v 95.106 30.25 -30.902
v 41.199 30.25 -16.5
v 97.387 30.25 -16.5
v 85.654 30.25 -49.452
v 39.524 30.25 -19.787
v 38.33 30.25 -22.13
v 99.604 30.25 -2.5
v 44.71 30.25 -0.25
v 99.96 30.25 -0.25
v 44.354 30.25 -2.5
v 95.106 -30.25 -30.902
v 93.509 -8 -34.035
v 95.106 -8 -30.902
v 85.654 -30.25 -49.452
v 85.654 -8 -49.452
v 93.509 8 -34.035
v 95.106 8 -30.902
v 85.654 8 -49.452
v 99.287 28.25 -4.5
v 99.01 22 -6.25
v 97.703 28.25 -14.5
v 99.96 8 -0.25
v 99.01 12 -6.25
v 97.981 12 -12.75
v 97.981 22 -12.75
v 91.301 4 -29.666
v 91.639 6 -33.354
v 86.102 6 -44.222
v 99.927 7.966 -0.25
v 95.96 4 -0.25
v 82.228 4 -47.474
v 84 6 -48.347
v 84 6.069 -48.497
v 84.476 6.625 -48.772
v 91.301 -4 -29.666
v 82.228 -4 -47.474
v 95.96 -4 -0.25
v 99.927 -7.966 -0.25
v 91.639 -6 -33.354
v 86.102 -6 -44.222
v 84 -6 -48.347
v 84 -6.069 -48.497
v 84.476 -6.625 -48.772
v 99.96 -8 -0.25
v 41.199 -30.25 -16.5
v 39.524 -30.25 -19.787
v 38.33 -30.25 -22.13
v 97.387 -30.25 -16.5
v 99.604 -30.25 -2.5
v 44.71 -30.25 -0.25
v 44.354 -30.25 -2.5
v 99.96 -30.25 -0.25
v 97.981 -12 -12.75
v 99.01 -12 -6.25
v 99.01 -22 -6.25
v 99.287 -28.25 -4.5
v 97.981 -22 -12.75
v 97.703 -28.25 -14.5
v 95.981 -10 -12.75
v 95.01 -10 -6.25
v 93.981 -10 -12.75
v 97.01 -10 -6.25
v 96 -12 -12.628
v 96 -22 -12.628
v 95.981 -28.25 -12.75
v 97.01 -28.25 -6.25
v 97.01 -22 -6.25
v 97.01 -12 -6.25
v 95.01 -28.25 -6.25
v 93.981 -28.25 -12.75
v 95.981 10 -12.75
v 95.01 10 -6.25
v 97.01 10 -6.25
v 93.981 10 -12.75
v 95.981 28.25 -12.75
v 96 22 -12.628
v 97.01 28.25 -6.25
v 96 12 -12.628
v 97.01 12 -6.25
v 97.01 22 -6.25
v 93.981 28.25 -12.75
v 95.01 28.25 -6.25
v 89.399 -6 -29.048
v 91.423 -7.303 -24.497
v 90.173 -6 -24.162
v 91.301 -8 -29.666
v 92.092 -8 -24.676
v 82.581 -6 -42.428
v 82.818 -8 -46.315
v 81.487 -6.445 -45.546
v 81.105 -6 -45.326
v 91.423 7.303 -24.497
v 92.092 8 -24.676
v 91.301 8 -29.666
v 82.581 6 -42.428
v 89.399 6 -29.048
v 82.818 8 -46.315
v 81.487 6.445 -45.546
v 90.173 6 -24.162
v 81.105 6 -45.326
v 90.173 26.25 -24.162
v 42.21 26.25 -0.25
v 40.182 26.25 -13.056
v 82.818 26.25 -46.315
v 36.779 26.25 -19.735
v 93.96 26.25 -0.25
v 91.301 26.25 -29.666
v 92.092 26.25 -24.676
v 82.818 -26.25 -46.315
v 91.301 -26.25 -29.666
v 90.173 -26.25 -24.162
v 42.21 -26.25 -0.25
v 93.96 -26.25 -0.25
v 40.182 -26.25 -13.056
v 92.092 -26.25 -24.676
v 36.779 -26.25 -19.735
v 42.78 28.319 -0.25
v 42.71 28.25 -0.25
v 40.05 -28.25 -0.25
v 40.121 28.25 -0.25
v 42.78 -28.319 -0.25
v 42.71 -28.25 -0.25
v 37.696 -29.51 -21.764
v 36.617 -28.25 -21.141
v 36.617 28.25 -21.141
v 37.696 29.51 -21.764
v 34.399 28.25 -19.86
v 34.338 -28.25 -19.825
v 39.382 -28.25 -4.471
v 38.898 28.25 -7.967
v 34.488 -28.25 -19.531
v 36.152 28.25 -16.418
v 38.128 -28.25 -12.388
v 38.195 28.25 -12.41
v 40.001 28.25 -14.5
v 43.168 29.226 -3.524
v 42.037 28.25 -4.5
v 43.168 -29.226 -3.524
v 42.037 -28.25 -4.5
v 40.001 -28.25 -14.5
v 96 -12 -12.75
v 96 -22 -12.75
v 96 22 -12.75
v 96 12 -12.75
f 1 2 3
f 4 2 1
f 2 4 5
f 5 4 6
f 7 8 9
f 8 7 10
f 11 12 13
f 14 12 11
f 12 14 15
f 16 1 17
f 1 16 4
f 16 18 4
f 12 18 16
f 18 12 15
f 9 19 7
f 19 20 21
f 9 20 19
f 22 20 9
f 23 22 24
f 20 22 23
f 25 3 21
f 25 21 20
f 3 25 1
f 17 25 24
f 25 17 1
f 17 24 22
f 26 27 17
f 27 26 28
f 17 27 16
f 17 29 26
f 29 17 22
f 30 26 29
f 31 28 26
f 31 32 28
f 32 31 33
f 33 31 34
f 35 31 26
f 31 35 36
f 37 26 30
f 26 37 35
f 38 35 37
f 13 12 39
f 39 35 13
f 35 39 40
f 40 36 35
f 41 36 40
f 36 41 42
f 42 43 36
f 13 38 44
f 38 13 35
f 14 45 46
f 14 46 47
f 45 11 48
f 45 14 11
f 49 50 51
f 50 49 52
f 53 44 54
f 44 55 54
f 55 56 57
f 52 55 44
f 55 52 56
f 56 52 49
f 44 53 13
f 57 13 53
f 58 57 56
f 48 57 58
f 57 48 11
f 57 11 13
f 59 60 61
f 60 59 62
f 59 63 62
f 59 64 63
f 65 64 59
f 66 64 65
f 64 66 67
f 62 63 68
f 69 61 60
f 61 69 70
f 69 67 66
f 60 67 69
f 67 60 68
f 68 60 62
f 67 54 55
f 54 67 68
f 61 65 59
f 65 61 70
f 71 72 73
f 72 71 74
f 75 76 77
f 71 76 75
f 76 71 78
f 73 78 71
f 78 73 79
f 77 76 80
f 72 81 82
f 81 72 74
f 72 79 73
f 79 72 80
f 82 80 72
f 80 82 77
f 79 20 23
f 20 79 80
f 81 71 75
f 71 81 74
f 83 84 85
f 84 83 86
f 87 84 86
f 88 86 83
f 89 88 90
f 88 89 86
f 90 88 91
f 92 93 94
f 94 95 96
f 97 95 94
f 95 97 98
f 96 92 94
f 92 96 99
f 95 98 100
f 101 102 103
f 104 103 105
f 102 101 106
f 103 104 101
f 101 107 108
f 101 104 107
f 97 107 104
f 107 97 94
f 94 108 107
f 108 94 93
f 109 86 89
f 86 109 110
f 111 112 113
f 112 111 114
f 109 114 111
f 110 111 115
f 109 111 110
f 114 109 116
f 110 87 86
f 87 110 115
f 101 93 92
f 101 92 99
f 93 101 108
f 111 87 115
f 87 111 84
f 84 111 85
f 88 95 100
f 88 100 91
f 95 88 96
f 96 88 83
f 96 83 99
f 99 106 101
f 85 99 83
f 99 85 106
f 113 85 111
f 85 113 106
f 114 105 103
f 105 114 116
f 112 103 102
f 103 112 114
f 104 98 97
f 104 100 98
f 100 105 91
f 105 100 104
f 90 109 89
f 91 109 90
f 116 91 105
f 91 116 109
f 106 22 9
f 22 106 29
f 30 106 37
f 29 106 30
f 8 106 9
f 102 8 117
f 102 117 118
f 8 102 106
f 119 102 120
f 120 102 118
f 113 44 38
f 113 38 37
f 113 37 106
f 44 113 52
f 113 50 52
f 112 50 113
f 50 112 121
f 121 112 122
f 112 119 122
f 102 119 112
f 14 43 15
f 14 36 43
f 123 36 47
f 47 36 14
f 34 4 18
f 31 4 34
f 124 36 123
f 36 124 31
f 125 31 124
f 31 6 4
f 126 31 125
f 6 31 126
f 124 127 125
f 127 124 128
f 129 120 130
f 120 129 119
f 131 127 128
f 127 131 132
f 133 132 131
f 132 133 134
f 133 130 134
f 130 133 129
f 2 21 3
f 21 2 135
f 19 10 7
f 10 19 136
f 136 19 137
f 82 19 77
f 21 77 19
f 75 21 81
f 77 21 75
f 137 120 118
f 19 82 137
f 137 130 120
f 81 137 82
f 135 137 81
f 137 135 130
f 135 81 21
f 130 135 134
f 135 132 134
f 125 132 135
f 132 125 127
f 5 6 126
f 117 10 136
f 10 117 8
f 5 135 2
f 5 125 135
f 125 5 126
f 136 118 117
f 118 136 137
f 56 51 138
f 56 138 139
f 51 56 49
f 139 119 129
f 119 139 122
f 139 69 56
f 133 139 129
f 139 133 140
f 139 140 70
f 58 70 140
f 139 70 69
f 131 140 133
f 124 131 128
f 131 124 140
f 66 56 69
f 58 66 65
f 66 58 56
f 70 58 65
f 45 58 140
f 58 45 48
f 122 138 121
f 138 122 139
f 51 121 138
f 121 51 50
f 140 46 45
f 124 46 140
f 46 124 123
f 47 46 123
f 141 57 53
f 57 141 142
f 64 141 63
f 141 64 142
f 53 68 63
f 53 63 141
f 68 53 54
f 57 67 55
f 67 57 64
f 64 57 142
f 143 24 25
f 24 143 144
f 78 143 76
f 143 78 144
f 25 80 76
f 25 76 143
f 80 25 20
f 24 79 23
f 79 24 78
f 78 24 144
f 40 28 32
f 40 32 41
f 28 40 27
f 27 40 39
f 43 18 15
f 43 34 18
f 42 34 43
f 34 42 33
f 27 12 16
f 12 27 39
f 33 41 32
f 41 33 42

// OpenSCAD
/* [Dimensions] */
Outer_Spool_Diameter = 200; //[150:400]
Inner_Spool_Diameter = 80;  //[50:200]
Inner_Spool_Width = 61; //[42:150]
Resolution = 20; //[20:50:200]
Lock_Tolerance = 0.15; //[0.05:0.05:0.2]
/* [Show] */
showLid = false;
showGuides= false;
showMainBin= true;

Split_Guides = true;

/* [Options] */
Bin_Handle = "Flat"; //["None","Flat","Curved"]
makeLid=false;

/* [Hidden] */
$fn=Resolution;

// Common variables
Tolerance = 0 + 0.25;
Max_Measurement = Outer_Spool_Diameter + 1;
Outer_Spool_Radius = Outer_Spool_Diameter / 2;
Inner_Spool_Radius = Inner_Spool_Diameter / 2;

// Core section variables
Core_Edge_Width = 0 + 22.25;
Core_Chamfer_Width = 0 + 4;
Core_Center_Width = Inner_Spool_Width - (Core_Chamfer_Width * 2 + Core_Edge_Width * 2 + Tolerance * 2);
Core_Total_Width = 2 * (Core_Edge_Width + Core_Chamfer_Width + Core_Center_Width/2);
Core_Inset_Radius = Outer_Spool_Radius - Core_Chamfer_Width;
Handle_Width = 0 + 20;

// Track variables
Guide_Track_Radius = Inner_Spool_Radius + Tolerance + 2.5;

Core_Edge_Offset = (Core_Center_Width/2) + Core_Chamfer_Width + (Core_Edge_Width/2);
Core_Chamfer_Offset = (Core_Center_Width/2) + (Core_Chamfer_Width/2);



////// Lid //////
if (showLid) translate([0,0,10]) lid();
if (showMainBin) mainBin();


module lid(){
  difference() {
    union() {
      intersection() {
        union() {
          translate([Inner_Spool_Radius - 10,-Core_Total_Width/2 + 3 + Tolerance / 2,-1]) {
            rotate(-45, [1,0,0]) {
              cube([Max_Measurement, sin(45) * 2, cos(45) * 2]);
            }
          }
          translate([Inner_Spool_Radius - 10,Core_Total_Width/2 - 5 - Tolerance / 2,-1]) {
            rotate(-45, [1,0,0]) {
              cube([Max_Measurement, sin(45) * 2, cos(45) * 2]);
            }
          }
            translate([Inner_Spool_Radius -10,-Core_Total_Width/2 + 4 + Tolerance / 2,-2]) {
              cube([Max_Measurement, Core_Total_Width-8 - Tolerance, 1.75]);
            }
          }
          rotate(90, [1,0,0]) {
            difference() {
              cylinder(Core_Total_Width, Outer_Spool_Radius, Outer_Spool_Radius, true);
              cylinder(Core_Total_Width + 1, Inner_Spool_Radius + 2.5, Inner_Spool_Radius + 2.5, true);
            }
          }
        }
        translate([Inner_Spool_Radius + 2,0, .625 - 1.75]) {
          cube([4, 10 - Tolerance/2, 1.75], true);
        }
      }
      translate([0,-Max_Measurement/2,-.25]) {
        cube([Max_Measurement, Max_Measurement, 10]);
      }
    }
  
}

module mainBin() {
////// MAIN BIN //////
// Union handle with bin.
union() {
  // Form exterior bin shape.
  difference() {
    // Form main bin shape.
    union() {
      // Form right edge section.
      translate([0,Core_Edge_Offset,0]) {
        rotate(90, [1,0,0]) {
          cylinder(Core_Edge_Width, Outer_Spool_Radius, Outer_Spool_Radius, true);
        }
      }
      // Form right chamfer section
      translate([0,Core_Chamfer_Offset,0]) {
        rotate(90, [1,0,0]) {
          cylinder(Core_Chamfer_Width, Outer_Spool_Radius, Core_Inset_Radius, true);
        }
      }
      // Form center section.
      if (Core_Center_Width > 0) {
        rotate(90, [1,0,0]) {
          cylinder(Core_Center_Width, Core_Inset_Radius, Core_Inset_Radius, true);
        }
      }
      // Form left chamfer section.
      translate([0,-Core_Chamfer_Offset,0]) {
        rotate(90, [1,0,0]) {
          cylinder(Core_Chamfer_Width, Core_Inset_Radius, Outer_Spool_Radius, true);
        }
      }
      // Form left edge section.
      translate([0,-Core_Edge_Offset,0]) {
        rotate(90, [1,0,0]) {
          cylinder(Core_Edge_Width, Outer_Spool_Radius, Outer_Spool_Radius, true);
        }
      }
    }
    // Slice off top of Bin.
    translate([-Outer_Spool_Radius,-Outer_Spool_Radius,-Tolerance]) {
      cube([Max_Measurement, Max_Measurement, Max_Measurement]);
    }
    // Slice off bottom of Bin.
    translate([0,-Outer_Spool_Radius,0]) {
      rotate(120, [0,1,0]) {
        translate([0,0,Tolerance]) {
          cube([Max_Measurement, Max_Measurement, Max_Measurement]);
        }
      }
    }
    // Slice off back of Bin.
    translate([0,0,0]) {
      rotate(90, [1,0,0]) {
        cylinder(Max_Measurement, Inner_Spool_Radius + Tolerance, Inner_Spool_Radius, true);
      }
    }
    // Remove remaining scrap from Bin.
    translate([-Max_Measurement,-Outer_Spool_Radius,-Outer_Spool_Radius]) {
      cube([Max_Measurement, Max_Measurement, Max_Measurement]);
    }
    // Carve out right track.
    translate([0,Core_Total_Width/2 - 2,-2.5]) {
      rotate(90, [0,1,0]) {
        linear_extrude(Max_Measurement) {
          polygon([[2,0],[0,2],[14,2],[12,0]]);
        }
      }
    }
    translate([0,Core_Total_Width/2 + 2,0]) {
      rotate(90, [1,0,0]) {
        cylinder(4, Guide_Track_Radius + 4, Guide_Track_Radius, false);
      }
    }
    // Carve out left track.
    translate([0,-Core_Total_Width/2 + 2,-2.5]) {
      rotate(90, [0,1,0]) {
        linear_extrude(Max_Measurement) {
          polygon([[2,0],[0,-2],[14,-2],[12,0]]);
        }
      }
    }
    translate([0,-Core_Total_Width/2 + 2,0]) {
      rotate(90, [1,0,0]) {
        cylinder(4, Guide_Track_Radius, Guide_Track_Radius + 4, false);
      }
    }
    // Form Left Lock Track
    intersection() {
      difference() {
        translate([0,-Core_Total_Width/2 + 20.25]) {
          rotate(90, [1,0,0]) {
            cylinder(20.25, Core_Inset_Radius + 2, Core_Inset_Radius + 2, false);
          }
        }
        translate([0,-Core_Total_Width/2 + 21.25]) {
          rotate(90, [1,0,0]) {
            cylinder(22.25, Core_Inset_Radius, Core_Inset_Radius, false);
          }
        }
       
      }
      translate([0,-Max_Measurement/2,-12.75]) {
        cube([Max_Measurement, Max_Measurement, 6.5]);
      }
    }
    translate([Core_Inset_Radius,-Core_Total_Width/2 + 8.25,-12.75]) {
      cube([Max_Measurement, 10, 6.5]);
    }
 
    // Form Right Lock Track
    intersection() {
      difference() {
        translate([0,Core_Total_Width/2]) {
          rotate(90, [1,0,0]) {
            cylinder(20.25, Core_Inset_Radius + 2, Core_Inset_Radius + 2, false);
          }
        }
        translate([0,Core_Total_Width/2 + 1]) {
          rotate(90, [1,0,0]) {
            cylinder(22.25, Core_Inset_Radius, Core_Inset_Radius, false);
          }
        }
      }
      translate([0,-Max_Measurement/2,-12.75]) {
        cube([Max_Measurement, Max_Measurement, 6.5]);
      }
    }
    translate([Core_Inset_Radius,Core_Total_Width/2 - 18.25,-12.75]) {
      cube([Max_Measurement, 10, 6.5]);
    }

    // Carve out showLid slot
    if (makeLid) {
      difference() {
        union() {
          translate([Inner_Spool_Radius+2,-Core_Total_Width/2 + 3,-1]) 
            rotate([-45,0,0]) 
              cube([Max_Measurement, sin(45) * 2, cos(45) * 2]);
            
          
          translate([Inner_Spool_Radius+2,Core_Total_Width/2 - 5,-1]) 
            rotate([-45,0,0]) 
              cube([Max_Measurement, sin(45) * 2, cos(45) * 2]);
            
          
          translate([Inner_Spool_Radius+2,-Core_Total_Width/2 + 4,-2]) {
            cube([Max_Measurement, Core_Total_Width-8, 3]);
          }
        }
        rotate(90, [1,0,0]) {
          cylinder(Max_Measurement, Inner_Spool_Radius + 2.5, Inner_Spool_Radius + 2, true);
        }
      }
      translate([0,0,Tolerance/2]) {
        cube([Max_Measurement, 10, 4], true);
      }
    } //makeLid


    // Remove bin interior.
    difference() {
      union() {
        rotate(90, [1,0,0]) {
          cylinder(Core_Total_Width - 8, Outer_Spool_Radius - 6, Outer_Spool_Radius - 6, true);
        }
        difference() {
          union() {
            if (Core_Center_Width > 0) {
              translate([0,-Core_Center_Width/2,0]) {
                rotate(90, [1,0,0]) {
                  cylinder(Core_Chamfer_Width, Core_Inset_Radius - 4, Core_Inset_Radius);
                }
              }
              translate([0,Core_Center_Width/2 + 4,0]) {
                rotate(90, [1,0,0]) {
                  cylinder(Core_Chamfer_Width, Core_Inset_Radius, Core_Inset_Radius - 4);
                }
              }
              translate([0,Core_Total_Width/2 - 4,0]) {
                rotate(90, [1,0,0]) {
                  cylinder(Core_Edge_Width - 4, Core_Inset_Radius, Core_Inset_Radius);
                }
              }
              translate([0,-Core_Center_Width/2 - 4,0]) {
                rotate(90, [1,0,0]) {
                  cylinder(Core_Edge_Width - 4, Core_Inset_Radius, Core_Inset_Radius);
                }
              }
            }
          }
          translate([0,-Max_Measurement/2,0]) {
            rotate(15, [0,1,0]) {
              cube([Max_Measurement, Max_Measurement, Max_Measurement]);
            }
          }

        }
      }
      translate([0,0,0]) {
        rotate(90, [1,0,0]) {
          cylinder(Core_Total_Width, Inner_Spool_Radius + Tolerance + 2, Inner_Spool_Radius + Tolerance + 2, true);
        }
      }
      //
      translate([0,-Outer_Spool_Radius,1.5]) {
        rotate(120, [0,1,0]) {
          cube([Max_Measurement, Max_Measurement, Max_Measurement]);
        }
      }
    }
  }

  if (Bin_Handle == "Flat") {
    if (Core_Center_Width > 0) {
      difference() {
        // Form handle
        translate([0,0,0]) {
          rotate(90, [1,0,0]) {
            cylinder(Core_Center_Width + Core_Chamfer_Width * 2, Outer_Spool_Radius, Outer_Spool_Radius, true);
          }
        }
        // Form inside of handle
        translate([0,0,0]) {
          rotate(90, [1,0,0]) {
            cylinder(Core_Center_Width + Core_Chamfer_Width * 2 + 2, Outer_Spool_Radius - 2, Outer_Spool_Radius - 2, true);
          }
        }
        // Form bottom of handle
        translate([0,-Outer_Spool_Radius,0]) {
          rotate(120, [0,1,0]) {
            cube([Max_Measurement, Max_Measurement, Max_Measurement]);
          }
        }
        // Form top of handle
        translate([0,-Outer_Spool_Radius,0]) {
          rotate(20, [0,1,0]) {
            cube([Max_Measurement, Max_Measurement, Max_Measurement]);
          }
        }
        // Remove scrap from handle.
        translate([-Max_Measurement + Outer_Spool_Radius - 16,-Outer_Spool_Radius,-Outer_Spool_Radius]) {
          cube([Max_Measurement, Max_Measurement, Max_Measurement]);
        }
      }
    } else {
    }
  }

  else if (Bin_Handle == "Curved") {
    if (Core_Center_Width > 0) {
      difference() {
        union() {
          // Form handle
          rotate(90, [1,0,0]) {
            cylinder(Core_Center_Width, Outer_Spool_Radius + 4, Outer_Spool_Radius + 4, true);
          }
          translate([0,Core_Center_Width/2 + Core_Chamfer_Width / 2 ,0]) {
            rotate(90, [1,0,0]) {
              cylinder(Core_Chamfer_Width, Outer_Spool_Radius, Outer_Spool_Radius + 4, true);
            }
          }
          translate([0,-Core_Center_Width/2 - Core_Chamfer_Width / 2 ,0]) {
            rotate(90, [1,0,0]) {
              cylinder(Core_Chamfer_Width, Outer_Spool_Radius + 4, Outer_Spool_Radius, true);
            }
          }
        }
        // Form inside of handle
        rotate(90, [1,0,0]) {
          cylinder(Core_Center_Width, Outer_Spool_Radius, Outer_Spool_Radius, true);
        }
        translate([0,-Core_Center_Width/2 - Core_Chamfer_Width / 2,0]) {
          rotate(90, [1,0,0]) {
            cylinder(Core_Chamfer_Width, Outer_Spool_Radius, Core_Inset_Radius, true);
          }
        }
        translate([0,Core_Center_Width/2 + Core_Chamfer_Width / 2 ,0]) {
          rotate(90, [1,0,0]) {
            cylinder(Core_Chamfer_Width, Core_Inset_Radius, Outer_Spool_Radius, true);
          }
        }
        // Form bottom of handle
        translate([0,-Outer_Spool_Radius,0]) {
          rotate(120, [0,1,0]) {
            cube([Max_Measurement, Max_Measurement, Max_Measurement]);
          }
        }
        // Form top of handle
        translate([0,-Outer_Spool_Radius,0]) {
          rotate(20, [0,1,0]) {
            cube([Max_Measurement, Max_Measurement, Max_Measurement]);
          }
        }
        // Remove scrap from handle.
        translate([-Max_Measurement + Outer_Spool_Radius - 16,-Outer_Spool_Radius,-Outer_Spool_Radius]) {
          cube([Max_Measurement, Max_Measurement, Max_Measurement*2]);
        }
        rotate(90, [1,0,0]) {
          cylinder(Core_Total_Width - 8, Outer_Spool_Radius - 6, Outer_Spool_Radius - 6, true);
        }
      }
    } else {
      difference() {
        union() {
          Handle_Width = Core_Edge_Width;
          // Form handle
          rotate(90, [1,0,0]) {
            cylinder(Handle_Width, Outer_Spool_Radius + 4, Outer_Spool_Radius + 4, true);
          }
          translate([0,Handle_Width/2 + Core_Chamfer_Width / 2 ,0]) {
            rotate(90, [1,0,0]) {
              cylinder(Core_Chamfer_Width, Outer_Spool_Radius, Outer_Spool_Radius + 4, true);
            }
          }
          translate([0,-Handle_Width/2 - Core_Chamfer_Width / 2 ,0]) {
            rotate(90, [1,0,0]) {
              cylinder(Core_Chamfer_Width, Outer_Spool_Radius + 4, Outer_Spool_Radius, true);
            }
          }
        }

        // Remove inside of handle
        rotate(90, [1,0,0]) {
          cylinder(Handle_Width - 2, Outer_Spool_Radius + 2, Outer_Spool_Radius + 2, true);
        }
        translate([0, Handle_Width/2, 0]) {
          rotate(90, [1,0,0]) {
            cylinder(Core_Chamfer_Width - 2, Outer_Spool_Radius, Outer_Spool_Radius + 2, true);
          }
        }
        translate([0, -Handle_Width/2, 0]) {
          rotate(90, [1,0,0]) {
            cylinder(Core_Chamfer_Width - 2, Outer_Spool_Radius + 2, Outer_Spool_Radius, true);
          }
        }


        // Form bottom of handle
        translate([0,-Outer_Spool_Radius,0]) {
          rotate(120, [0,1,0]) {
            cube([Max_Measurement, Max_Measurement, Max_Measurement]);
          }
        }
        // Form top of handle
        translate([0,-Outer_Spool_Radius,0]) {
          rotate(20, [0,1,0]) {
            cube([Max_Measurement, Max_Measurement, Max_Measurement]);
          }
        }
        // Remove scrap from handle.
        translate([-Max_Measurement + Outer_Spool_Radius - 16,-Outer_Spool_Radius,-Outer_Spool_Radius]) {
          cube([Max_Measurement, Max_Measurement, Max_Measurement*2]);
        }
        rotate(90, [1,0,0]) {
          cylinder(Core_Total_Width - 8, Outer_Spool_Radius - 6, Outer_Spool_Radius - 6, true);
        }
      }
    }
  }
}
}


////// LOCKS //////

module locks() {
  color("red") translate([20,0,0]) {
    difference() {
      union() {
        // Left and right handle base.
        rotate(90, [1,0,0]) {
            cylinder(Core_Total_Width, Outer_Spool_Radius - 2 - Lock_Tolerance, Outer_Spool_Radius - 2 - Lock_Tolerance, true);
        }

        // Left bump ramp.
        translate([0,-Core_Center_Width/2 - 18.75,0]) {
          rotate(90, [1,0,0]) {
              cylinder(3, Outer_Spool_Radius - 2 + Lock_Tolerance * 2, Outer_Spool_Radius - 2 - Lock_Tolerance, true);
          }
        }
        translate([0,-Core_Center_Width/2 - 14,0]) {
          rotate(90, [1,0,0]) {
              cylinder(2, Outer_Spool_Radius - 2 - Lock_Tolerance, Outer_Spool_Radius - 2 + Lock_Tolerance * 2, true);
          }
        }

        // Right bump ramp.
        translate([0,Core_Center_Width/2 + 18.75,0]) {
          rotate(90, [1,0,0]) {
              cylinder(3, Outer_Spool_Radius - 2 - Lock_Tolerance, Outer_Spool_Radius - 2 + Lock_Tolerance * 2, true);
          }
        }
        translate([0,Core_Center_Width/2 + 14,0]) {
          rotate(90, [1,0,0]) {
              cylinder(2, Outer_Spool_Radius - 2 + Lock_Tolerance * 2, Outer_Spool_Radius - 2 - Lock_Tolerance, true);
          }
        }

        // Left lock handle.
        translate([Core_Inset_Radius + Tolerance,-Core_Center_Width/2 - 15 -2.75,-14.5]) {
          cube([7,2.75,8], false);
        }
        // Right lock handle.
        translate([Core_Inset_Radius + Tolerance,Core_Center_Width/2 + 15,-14.5]) {
          cube([7,2.75,8], false);
        }
      }

      // Slice off inner edge of handle bases.
      rotate(90, [1,0,0]) {
        cylinder(Core_Total_Width, Core_Inset_Radius + Lock_Tolerance, Core_Inset_Radius + Lock_Tolerance, true);
      }
      // Split handle bases.
      cube([Max_Measurement, Core_Center_Width + 26, Max_Measurement], true);
      // Slice off top of locks.
      translate([0,0,Max_Measurement/2 - 6.5]) {
        cube([Max_Measurement*2, Max_Measurement, Max_Measurement], true);
      }
      // Slice off bottom of locks.
      translate([0,0,-Outer_Spool_Radius-13]) {
        cube([Max_Measurement*2, Max_Measurement, Max_Measurement], true);
      }
      // Slice off rest of locks.
      translate([0,0,-Max_Measurement/2 - 130.5]) {
        cube([Max_Measurement*2, Max_Measurement, Max_Measurement], true);
      }
      translate([-8,0,0]) {
        cube([Max_Measurement, Max_Measurement, Max_Measurement], true);
      }
      // Add notch to indicate top
      translate([Core_Inset_Radius + 2,0,-4]) {
        rotate(45, [0,1,0]) {
          cube([2,Core_Total_Width,8], true);
        }
      }
    }
  }
}


////// GUIDES //////
module guides(){
translate([0,Inner_Spool_Width + 20,0]){
  difference() {
    intersection() {
      union() {
        for(i=[0:1:11]) {
          rotate(30 * i, [0,1,0]) {
            difference() {
              union() {
                translate([0,Core_Total_Width/2 - 2,-2.5]) {
                  rotate(90, [0,1,0]) {
                    linear_extrude(Max_Measurement) {
                      polygon([[2,0],[0,2],[14,2],[12,0]]);
                    }
                  }
                }
                translate([0,-Core_Total_Width/2 + 2,-2.5]) {
                  rotate(90, [0,1,0]) {
                    linear_extrude(Max_Measurement) {
                      polygon([[2,0],[0,-2],[14,-2],[12,0]]);
                    }
                  }
                }
              }
              intersection() {
                difference() {
                  rotate(90, [1,0,0]) {
                    cylinder(Max_Measurement, Core_Inset_Radius + 2, Core_Inset_Radius + 2, true);
                  }
                  rotate(90, [1,0,0]) {
                    cylinder(Max_Measurement, Core_Inset_Radius, Core_Inset_Radius, true);
                  }
                }
                translate([0,-Max_Measurement/2,-12.75]) {
                  cube([Max_Measurement, Max_Measurement, 6.5]);
                }
                translate([0,-Max_Measurement/2,-12.75]) {
                  cube([Max_Measurement, Max_Measurement, 6.5]);
                }
              }
            }
          }
        }
        // Left
        translate([0,Core_Total_Width/2 - 1,0]) {
          rotate(90, [1,0,0]) {
            cylinder(2, Inner_Spool_Radius + 2 + Tolerance * 2, Inner_Spool_Radius + 2 + Tolerance * 2, true);
          }
        }
        translate([0,Core_Total_Width/2 - 1,0]) {
          rotate(90, [1,0,0]) {
            cylinder(2, Inner_Spool_Radius + 4 + Tolerance * 2, Inner_Spool_Radius + 2 + Tolerance * 2, true);
          }
        }
        // Right
        translate([0,-Core_Total_Width/2 + 1,0]) {
          rotate(90, [1,0,0]) {
            cylinder(2, Inner_Spool_Radius + 2 + Tolerance * 2, Inner_Spool_Radius + 2 + Tolerance * 2, true);
          }
          rotate(90, [1,0,0]) {
            cylinder(2, Inner_Spool_Radius + 2 + Tolerance * 2, Inner_Spool_Radius + 4 + Tolerance * 2, true);
          }
        }

      }
      rotate(90, [1,0,0]) {
        cylinder(Max_Measurement, Outer_Spool_Radius, Outer_Spool_Radius, true);
      }
    }
    // Trim central core.
    rotate(90, [1,0,0]) {
      cylinder(Max_Measurement, Inner_Spool_Radius + Tolerance / 2, Inner_Spool_Radius + Tolerance / 2, true);
    }
    // Split guide.
    if (Split_Guides) {
      translate([2.5,0,Max_Measurement/2]) {
        cube([Tolerance,Max_Measurement,Max_Measurement], true);
      }
    }
  }
}
}
